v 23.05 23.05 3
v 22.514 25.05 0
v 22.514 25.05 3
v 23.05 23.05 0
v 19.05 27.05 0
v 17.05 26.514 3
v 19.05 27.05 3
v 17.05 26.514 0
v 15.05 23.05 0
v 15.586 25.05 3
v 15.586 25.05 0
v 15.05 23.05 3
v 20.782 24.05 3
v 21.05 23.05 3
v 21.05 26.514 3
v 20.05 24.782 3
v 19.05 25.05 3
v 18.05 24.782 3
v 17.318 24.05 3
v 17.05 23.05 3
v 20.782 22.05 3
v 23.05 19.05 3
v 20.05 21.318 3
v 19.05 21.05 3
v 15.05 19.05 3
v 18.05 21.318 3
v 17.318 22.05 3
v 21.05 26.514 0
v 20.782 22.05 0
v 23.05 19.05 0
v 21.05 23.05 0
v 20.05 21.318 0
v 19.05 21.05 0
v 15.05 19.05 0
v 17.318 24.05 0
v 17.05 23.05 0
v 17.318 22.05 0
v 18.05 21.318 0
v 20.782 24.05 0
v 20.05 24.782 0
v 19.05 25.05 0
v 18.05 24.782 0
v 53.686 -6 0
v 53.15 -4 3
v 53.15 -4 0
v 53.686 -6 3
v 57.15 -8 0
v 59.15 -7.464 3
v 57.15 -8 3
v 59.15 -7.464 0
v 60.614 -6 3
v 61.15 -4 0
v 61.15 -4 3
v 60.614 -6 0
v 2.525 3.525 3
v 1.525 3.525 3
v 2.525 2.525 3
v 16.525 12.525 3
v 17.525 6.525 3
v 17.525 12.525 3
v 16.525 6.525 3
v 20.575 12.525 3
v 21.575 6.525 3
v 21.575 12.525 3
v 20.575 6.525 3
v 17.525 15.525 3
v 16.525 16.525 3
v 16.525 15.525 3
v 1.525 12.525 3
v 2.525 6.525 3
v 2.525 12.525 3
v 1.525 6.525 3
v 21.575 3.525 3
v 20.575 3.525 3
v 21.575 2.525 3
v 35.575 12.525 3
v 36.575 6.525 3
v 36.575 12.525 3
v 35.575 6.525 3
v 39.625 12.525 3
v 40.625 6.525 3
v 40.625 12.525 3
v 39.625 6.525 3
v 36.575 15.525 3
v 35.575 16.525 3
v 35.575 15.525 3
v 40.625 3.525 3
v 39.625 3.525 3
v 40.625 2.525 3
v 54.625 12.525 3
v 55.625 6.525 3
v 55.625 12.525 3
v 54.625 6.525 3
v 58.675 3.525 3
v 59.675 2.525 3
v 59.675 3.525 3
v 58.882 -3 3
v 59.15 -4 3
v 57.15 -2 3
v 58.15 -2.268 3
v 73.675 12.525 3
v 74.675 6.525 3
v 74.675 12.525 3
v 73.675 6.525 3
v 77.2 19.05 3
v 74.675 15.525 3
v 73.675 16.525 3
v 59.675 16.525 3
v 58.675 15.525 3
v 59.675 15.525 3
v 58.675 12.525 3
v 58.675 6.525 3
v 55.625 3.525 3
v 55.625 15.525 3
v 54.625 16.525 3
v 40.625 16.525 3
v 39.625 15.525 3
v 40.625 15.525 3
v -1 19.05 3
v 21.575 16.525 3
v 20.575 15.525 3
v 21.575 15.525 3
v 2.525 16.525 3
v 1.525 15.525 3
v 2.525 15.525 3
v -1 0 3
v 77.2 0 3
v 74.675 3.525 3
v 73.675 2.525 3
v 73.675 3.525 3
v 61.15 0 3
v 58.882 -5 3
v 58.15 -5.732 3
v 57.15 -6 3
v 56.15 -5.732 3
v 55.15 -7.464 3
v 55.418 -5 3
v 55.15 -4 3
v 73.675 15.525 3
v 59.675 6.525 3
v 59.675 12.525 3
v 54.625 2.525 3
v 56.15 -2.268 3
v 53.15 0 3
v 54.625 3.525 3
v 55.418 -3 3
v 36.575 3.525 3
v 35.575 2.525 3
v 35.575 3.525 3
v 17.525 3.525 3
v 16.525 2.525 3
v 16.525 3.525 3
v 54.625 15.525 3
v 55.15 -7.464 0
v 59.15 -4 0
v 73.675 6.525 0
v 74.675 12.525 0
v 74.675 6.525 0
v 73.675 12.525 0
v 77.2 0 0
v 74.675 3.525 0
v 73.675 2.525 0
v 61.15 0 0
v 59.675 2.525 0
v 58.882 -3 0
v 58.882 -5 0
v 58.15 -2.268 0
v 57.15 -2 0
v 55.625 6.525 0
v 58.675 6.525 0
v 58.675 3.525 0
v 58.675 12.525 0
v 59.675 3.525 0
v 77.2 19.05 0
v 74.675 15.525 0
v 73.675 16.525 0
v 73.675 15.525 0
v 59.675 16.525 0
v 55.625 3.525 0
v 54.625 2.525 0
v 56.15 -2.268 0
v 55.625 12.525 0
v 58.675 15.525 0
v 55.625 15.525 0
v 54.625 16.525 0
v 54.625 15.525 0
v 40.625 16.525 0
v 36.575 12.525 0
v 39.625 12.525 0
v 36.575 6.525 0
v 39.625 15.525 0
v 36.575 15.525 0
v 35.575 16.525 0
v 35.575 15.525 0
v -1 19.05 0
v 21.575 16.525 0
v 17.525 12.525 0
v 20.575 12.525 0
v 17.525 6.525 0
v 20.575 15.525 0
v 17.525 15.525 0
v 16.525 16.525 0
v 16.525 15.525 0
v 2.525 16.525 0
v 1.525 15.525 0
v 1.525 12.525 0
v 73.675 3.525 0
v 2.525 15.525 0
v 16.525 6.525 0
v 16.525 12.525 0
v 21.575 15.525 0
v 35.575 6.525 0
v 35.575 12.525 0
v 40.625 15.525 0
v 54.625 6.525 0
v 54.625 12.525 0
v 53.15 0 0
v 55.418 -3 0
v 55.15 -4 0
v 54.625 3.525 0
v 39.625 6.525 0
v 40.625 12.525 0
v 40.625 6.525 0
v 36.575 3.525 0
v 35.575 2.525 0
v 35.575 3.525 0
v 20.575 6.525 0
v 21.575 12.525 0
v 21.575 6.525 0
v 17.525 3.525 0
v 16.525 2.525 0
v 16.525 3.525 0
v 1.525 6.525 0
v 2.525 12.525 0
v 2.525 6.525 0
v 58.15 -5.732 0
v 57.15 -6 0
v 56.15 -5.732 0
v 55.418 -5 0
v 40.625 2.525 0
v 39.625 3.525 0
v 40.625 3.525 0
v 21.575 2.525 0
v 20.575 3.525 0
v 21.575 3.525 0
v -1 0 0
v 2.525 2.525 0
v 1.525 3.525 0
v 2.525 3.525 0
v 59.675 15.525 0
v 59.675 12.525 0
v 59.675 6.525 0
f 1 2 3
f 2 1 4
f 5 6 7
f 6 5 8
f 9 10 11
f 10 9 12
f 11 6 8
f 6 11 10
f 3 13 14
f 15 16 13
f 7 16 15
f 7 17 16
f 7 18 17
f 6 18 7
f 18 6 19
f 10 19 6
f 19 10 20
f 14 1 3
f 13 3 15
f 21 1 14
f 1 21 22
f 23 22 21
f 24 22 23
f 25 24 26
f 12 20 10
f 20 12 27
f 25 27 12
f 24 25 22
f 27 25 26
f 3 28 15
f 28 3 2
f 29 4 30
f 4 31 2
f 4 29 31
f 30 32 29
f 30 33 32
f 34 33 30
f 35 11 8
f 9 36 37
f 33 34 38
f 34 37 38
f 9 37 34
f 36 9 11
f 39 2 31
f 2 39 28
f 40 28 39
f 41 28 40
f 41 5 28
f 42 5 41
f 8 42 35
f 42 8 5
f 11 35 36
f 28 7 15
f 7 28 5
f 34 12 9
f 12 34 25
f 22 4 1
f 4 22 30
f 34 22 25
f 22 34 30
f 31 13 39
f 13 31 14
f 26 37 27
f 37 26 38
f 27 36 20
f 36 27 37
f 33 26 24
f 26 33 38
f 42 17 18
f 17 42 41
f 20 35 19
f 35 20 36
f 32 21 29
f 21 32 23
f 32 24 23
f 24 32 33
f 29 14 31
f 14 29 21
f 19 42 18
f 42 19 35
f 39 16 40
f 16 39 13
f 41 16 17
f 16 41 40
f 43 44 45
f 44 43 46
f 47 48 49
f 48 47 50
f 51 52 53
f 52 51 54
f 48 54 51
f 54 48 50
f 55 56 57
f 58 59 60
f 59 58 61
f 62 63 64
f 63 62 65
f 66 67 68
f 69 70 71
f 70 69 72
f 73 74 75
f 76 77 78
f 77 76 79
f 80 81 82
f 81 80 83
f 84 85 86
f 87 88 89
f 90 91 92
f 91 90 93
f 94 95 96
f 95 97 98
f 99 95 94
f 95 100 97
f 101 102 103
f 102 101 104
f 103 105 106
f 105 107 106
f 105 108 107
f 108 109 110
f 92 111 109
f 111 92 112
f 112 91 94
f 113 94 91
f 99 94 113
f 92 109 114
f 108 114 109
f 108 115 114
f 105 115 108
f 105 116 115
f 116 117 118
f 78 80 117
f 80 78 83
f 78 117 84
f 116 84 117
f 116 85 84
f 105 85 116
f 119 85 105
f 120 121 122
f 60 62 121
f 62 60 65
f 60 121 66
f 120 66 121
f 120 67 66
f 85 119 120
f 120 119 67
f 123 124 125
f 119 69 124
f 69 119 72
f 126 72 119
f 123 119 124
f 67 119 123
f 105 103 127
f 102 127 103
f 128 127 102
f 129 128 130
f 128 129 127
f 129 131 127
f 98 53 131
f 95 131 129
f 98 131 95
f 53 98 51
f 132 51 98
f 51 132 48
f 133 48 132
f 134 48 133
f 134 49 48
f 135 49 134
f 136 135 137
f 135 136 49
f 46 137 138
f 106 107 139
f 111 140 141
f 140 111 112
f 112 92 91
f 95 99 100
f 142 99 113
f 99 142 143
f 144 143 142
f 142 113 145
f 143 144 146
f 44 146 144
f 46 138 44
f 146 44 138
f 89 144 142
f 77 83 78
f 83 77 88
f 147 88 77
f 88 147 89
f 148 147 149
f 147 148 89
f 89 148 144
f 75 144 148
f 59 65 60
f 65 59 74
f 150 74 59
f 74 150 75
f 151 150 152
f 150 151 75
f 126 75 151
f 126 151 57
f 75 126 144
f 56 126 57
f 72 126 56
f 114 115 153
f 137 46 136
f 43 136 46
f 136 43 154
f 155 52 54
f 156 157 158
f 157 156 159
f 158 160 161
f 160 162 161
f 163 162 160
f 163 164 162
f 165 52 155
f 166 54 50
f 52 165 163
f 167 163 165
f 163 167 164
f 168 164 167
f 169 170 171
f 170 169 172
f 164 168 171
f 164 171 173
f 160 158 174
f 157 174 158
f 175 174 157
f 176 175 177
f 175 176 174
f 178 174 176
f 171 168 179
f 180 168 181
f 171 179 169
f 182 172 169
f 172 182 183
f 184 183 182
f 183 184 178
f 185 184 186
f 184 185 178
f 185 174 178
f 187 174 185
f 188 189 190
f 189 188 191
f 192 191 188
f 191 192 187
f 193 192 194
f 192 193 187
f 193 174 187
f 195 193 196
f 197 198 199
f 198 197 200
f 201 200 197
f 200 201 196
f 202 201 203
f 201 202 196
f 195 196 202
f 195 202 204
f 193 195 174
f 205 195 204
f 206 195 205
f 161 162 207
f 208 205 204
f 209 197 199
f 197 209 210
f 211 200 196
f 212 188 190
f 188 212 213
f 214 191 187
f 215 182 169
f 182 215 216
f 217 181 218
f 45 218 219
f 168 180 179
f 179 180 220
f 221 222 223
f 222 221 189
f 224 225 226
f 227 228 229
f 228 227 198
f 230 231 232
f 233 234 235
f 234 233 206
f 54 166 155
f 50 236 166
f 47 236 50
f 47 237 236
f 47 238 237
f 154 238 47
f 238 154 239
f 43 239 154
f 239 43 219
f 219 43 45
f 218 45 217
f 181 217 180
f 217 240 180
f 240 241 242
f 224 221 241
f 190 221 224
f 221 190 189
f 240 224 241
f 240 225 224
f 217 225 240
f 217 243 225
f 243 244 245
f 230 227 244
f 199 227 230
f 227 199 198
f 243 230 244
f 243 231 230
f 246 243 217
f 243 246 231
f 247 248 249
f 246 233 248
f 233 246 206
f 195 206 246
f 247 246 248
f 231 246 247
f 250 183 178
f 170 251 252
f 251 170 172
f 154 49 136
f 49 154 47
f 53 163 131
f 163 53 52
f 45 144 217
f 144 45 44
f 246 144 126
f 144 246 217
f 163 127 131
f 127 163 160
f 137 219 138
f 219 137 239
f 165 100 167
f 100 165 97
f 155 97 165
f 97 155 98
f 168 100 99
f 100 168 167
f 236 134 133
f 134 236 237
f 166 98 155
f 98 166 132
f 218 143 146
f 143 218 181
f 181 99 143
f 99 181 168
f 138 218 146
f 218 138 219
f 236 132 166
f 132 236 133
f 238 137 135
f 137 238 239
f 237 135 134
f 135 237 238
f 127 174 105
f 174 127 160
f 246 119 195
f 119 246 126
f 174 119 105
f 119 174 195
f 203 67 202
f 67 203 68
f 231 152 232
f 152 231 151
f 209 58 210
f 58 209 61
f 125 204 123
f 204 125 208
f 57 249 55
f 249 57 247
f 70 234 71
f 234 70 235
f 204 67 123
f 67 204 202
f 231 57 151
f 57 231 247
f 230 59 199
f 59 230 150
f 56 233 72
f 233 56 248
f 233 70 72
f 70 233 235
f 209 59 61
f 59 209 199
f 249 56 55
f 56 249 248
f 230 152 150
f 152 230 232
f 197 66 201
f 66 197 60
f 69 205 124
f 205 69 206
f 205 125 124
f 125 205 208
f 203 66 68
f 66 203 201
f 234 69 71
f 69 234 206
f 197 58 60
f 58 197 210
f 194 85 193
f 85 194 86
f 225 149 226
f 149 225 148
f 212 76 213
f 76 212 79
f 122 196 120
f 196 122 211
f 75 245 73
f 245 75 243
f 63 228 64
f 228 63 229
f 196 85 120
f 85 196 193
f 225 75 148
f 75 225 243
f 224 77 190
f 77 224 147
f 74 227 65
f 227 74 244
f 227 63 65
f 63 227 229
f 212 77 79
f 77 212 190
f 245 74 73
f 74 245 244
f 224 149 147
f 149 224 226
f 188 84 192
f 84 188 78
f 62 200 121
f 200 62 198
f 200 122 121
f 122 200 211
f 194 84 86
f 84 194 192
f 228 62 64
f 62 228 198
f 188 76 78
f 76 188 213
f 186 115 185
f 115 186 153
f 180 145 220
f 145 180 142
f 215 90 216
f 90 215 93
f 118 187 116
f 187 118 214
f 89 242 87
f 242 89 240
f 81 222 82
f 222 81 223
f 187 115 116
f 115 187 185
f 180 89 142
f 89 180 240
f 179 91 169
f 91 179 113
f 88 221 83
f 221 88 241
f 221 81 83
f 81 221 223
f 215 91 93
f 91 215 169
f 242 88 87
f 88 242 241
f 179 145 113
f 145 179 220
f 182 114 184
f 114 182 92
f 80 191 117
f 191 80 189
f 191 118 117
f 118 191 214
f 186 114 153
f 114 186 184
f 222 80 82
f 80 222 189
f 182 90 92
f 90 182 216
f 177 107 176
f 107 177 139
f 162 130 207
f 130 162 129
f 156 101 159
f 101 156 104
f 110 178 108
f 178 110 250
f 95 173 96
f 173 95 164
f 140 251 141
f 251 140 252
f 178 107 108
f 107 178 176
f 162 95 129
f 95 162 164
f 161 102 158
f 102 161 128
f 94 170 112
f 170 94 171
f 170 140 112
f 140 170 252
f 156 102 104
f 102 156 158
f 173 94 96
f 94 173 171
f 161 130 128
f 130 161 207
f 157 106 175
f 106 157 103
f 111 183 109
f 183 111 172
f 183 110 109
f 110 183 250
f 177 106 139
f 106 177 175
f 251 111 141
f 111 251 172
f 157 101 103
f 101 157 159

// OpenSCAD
//Thickness of entire plate
plateThickness=3;
//Unit square length, from Cherry MX data sheet
lkey=19.05;
//Hole size, from Cherry MX data sheet
holesize=14;
//length, in units, of board
width=4;
//Height, in units, of board
height=1;
//Radius of mounting holes
mountingholeradius=2;
//Width around the mounting holes
mountingtabwidth=2+mountingholeradius;
//Tab position ratio
taboffsetratio = 1/4;
//height of switch clasp cutouts
cutoutheight = 3;
//width of switch clasp cutouts
cutoutwidth = 1;

//calculated vars

holediff=lkey-holesize;
w=width*lkey;
h=height*lkey;


//my custom keyboard layout layer
myKeyboard = [
//start column 0
	[[0,0],1.5],
//start column 1
	[[1.5,0],1],
//start column 2
	[[2.5,0],1],
];

//poker keyboard layout layer
pokerkeyboard = [
//start ROW 0
[[0,0],1],
[[1,0],1],
[[2,0],1],
[[3,0],1],
];

module extendedMountingHole(){
    difference(){
        union(){
			cylinder(h=plateThickness,r=mountingtabwidth, $fn=12);
            translate([-mountingtabwidth,0,0]){
                cube([(mountingtabwidth)*2,
                       mountingtabwidth,
                       plateThickness]);
            }
        }
        cylinder(h=plateThickness,r=mountingholeradius, $fn=12);
    }
}

module plate(w,h){
    translate([-1,0,0])
	cube([w+2,h,plateThickness]);
    translate([w*taboffsetratio,h+mountingtabwidth,0]){
        rotate([0,0,180]){
            extendedMountingHole();
        }
    }
    translate([w-w*taboffsetratio,-mountingtabwidth,0]){
        extendedMountingHole();
    }
}

module switchhole(){
	union(){
		cube([holesize,holesize,plateThickness]);

		translate([-cutoutwidth,1,0])
		cube([holesize+2*cutoutwidth,cutoutheight,plateThickness]);

		translate([-cutoutwidth,holesize-cutoutwidth-cutoutheight,0])
		cube([holesize+2*cutoutwidth,cutoutheight,plateThickness]);
	}
}

module holematrix(holes,startx,starty){
	for (key = holes){
		translate([startx+lkey*key[0][0], starty-lkey*key[0][1], 0])
		translate([(lkey*key[1]-holesize)/2,(lkey - holesize)/2, 0])
		switchhole();
	}
}

module mountingholes(){
	translate([(1+1/3)*lkey,3.5*lkey,0])
	cylinder(h=plateThickness,r=mountingholeradius, $fn=12);

	translate([(13+2/3)*lkey,3.5*lkey,0])
	cylinder(h=plateThickness,r=mountingholeradius, $fn=12);
	
	translate([(6.75)*lkey,2.5*lkey,0])
	cylinder(h=plateThickness,r=mountingholeradius, $fn=12);

	translate([(6.75)*lkey,2.5*lkey,0])
	cylinder(h=plateThickness,r=mountingholeradius, $fn=12);

	translate([(14.8)*lkey,2*lkey,0])
	cylinder(h=plateThickness,r=mountingholeradius, $fn=12);

	translate([(.2)*lkey,2*lkey,0])
	cylinder(h=plateThickness,r=mountingholeradius, $fn=12);

	translate([(10)*lkey,.5*lkey,0])
	cylinder(h=plateThickness,r=mountingholeradius, $fn=12);
}

module myplate(){
	difference(){
		plate(w,h);
		holematrix(myKeyboard,0,h-lkey);
        // Mounting holes are now included in the plate.
		//mountingholes();
		//translate([152.5,0,0]) cube([.001,150,150]);
	}
}

module pokerplate(){
	difference(){
		plate(w,h);
		holematrix(pokerkeyboard,0,h-lkey);
		mountingholes();
	}
}

pokerplate();
